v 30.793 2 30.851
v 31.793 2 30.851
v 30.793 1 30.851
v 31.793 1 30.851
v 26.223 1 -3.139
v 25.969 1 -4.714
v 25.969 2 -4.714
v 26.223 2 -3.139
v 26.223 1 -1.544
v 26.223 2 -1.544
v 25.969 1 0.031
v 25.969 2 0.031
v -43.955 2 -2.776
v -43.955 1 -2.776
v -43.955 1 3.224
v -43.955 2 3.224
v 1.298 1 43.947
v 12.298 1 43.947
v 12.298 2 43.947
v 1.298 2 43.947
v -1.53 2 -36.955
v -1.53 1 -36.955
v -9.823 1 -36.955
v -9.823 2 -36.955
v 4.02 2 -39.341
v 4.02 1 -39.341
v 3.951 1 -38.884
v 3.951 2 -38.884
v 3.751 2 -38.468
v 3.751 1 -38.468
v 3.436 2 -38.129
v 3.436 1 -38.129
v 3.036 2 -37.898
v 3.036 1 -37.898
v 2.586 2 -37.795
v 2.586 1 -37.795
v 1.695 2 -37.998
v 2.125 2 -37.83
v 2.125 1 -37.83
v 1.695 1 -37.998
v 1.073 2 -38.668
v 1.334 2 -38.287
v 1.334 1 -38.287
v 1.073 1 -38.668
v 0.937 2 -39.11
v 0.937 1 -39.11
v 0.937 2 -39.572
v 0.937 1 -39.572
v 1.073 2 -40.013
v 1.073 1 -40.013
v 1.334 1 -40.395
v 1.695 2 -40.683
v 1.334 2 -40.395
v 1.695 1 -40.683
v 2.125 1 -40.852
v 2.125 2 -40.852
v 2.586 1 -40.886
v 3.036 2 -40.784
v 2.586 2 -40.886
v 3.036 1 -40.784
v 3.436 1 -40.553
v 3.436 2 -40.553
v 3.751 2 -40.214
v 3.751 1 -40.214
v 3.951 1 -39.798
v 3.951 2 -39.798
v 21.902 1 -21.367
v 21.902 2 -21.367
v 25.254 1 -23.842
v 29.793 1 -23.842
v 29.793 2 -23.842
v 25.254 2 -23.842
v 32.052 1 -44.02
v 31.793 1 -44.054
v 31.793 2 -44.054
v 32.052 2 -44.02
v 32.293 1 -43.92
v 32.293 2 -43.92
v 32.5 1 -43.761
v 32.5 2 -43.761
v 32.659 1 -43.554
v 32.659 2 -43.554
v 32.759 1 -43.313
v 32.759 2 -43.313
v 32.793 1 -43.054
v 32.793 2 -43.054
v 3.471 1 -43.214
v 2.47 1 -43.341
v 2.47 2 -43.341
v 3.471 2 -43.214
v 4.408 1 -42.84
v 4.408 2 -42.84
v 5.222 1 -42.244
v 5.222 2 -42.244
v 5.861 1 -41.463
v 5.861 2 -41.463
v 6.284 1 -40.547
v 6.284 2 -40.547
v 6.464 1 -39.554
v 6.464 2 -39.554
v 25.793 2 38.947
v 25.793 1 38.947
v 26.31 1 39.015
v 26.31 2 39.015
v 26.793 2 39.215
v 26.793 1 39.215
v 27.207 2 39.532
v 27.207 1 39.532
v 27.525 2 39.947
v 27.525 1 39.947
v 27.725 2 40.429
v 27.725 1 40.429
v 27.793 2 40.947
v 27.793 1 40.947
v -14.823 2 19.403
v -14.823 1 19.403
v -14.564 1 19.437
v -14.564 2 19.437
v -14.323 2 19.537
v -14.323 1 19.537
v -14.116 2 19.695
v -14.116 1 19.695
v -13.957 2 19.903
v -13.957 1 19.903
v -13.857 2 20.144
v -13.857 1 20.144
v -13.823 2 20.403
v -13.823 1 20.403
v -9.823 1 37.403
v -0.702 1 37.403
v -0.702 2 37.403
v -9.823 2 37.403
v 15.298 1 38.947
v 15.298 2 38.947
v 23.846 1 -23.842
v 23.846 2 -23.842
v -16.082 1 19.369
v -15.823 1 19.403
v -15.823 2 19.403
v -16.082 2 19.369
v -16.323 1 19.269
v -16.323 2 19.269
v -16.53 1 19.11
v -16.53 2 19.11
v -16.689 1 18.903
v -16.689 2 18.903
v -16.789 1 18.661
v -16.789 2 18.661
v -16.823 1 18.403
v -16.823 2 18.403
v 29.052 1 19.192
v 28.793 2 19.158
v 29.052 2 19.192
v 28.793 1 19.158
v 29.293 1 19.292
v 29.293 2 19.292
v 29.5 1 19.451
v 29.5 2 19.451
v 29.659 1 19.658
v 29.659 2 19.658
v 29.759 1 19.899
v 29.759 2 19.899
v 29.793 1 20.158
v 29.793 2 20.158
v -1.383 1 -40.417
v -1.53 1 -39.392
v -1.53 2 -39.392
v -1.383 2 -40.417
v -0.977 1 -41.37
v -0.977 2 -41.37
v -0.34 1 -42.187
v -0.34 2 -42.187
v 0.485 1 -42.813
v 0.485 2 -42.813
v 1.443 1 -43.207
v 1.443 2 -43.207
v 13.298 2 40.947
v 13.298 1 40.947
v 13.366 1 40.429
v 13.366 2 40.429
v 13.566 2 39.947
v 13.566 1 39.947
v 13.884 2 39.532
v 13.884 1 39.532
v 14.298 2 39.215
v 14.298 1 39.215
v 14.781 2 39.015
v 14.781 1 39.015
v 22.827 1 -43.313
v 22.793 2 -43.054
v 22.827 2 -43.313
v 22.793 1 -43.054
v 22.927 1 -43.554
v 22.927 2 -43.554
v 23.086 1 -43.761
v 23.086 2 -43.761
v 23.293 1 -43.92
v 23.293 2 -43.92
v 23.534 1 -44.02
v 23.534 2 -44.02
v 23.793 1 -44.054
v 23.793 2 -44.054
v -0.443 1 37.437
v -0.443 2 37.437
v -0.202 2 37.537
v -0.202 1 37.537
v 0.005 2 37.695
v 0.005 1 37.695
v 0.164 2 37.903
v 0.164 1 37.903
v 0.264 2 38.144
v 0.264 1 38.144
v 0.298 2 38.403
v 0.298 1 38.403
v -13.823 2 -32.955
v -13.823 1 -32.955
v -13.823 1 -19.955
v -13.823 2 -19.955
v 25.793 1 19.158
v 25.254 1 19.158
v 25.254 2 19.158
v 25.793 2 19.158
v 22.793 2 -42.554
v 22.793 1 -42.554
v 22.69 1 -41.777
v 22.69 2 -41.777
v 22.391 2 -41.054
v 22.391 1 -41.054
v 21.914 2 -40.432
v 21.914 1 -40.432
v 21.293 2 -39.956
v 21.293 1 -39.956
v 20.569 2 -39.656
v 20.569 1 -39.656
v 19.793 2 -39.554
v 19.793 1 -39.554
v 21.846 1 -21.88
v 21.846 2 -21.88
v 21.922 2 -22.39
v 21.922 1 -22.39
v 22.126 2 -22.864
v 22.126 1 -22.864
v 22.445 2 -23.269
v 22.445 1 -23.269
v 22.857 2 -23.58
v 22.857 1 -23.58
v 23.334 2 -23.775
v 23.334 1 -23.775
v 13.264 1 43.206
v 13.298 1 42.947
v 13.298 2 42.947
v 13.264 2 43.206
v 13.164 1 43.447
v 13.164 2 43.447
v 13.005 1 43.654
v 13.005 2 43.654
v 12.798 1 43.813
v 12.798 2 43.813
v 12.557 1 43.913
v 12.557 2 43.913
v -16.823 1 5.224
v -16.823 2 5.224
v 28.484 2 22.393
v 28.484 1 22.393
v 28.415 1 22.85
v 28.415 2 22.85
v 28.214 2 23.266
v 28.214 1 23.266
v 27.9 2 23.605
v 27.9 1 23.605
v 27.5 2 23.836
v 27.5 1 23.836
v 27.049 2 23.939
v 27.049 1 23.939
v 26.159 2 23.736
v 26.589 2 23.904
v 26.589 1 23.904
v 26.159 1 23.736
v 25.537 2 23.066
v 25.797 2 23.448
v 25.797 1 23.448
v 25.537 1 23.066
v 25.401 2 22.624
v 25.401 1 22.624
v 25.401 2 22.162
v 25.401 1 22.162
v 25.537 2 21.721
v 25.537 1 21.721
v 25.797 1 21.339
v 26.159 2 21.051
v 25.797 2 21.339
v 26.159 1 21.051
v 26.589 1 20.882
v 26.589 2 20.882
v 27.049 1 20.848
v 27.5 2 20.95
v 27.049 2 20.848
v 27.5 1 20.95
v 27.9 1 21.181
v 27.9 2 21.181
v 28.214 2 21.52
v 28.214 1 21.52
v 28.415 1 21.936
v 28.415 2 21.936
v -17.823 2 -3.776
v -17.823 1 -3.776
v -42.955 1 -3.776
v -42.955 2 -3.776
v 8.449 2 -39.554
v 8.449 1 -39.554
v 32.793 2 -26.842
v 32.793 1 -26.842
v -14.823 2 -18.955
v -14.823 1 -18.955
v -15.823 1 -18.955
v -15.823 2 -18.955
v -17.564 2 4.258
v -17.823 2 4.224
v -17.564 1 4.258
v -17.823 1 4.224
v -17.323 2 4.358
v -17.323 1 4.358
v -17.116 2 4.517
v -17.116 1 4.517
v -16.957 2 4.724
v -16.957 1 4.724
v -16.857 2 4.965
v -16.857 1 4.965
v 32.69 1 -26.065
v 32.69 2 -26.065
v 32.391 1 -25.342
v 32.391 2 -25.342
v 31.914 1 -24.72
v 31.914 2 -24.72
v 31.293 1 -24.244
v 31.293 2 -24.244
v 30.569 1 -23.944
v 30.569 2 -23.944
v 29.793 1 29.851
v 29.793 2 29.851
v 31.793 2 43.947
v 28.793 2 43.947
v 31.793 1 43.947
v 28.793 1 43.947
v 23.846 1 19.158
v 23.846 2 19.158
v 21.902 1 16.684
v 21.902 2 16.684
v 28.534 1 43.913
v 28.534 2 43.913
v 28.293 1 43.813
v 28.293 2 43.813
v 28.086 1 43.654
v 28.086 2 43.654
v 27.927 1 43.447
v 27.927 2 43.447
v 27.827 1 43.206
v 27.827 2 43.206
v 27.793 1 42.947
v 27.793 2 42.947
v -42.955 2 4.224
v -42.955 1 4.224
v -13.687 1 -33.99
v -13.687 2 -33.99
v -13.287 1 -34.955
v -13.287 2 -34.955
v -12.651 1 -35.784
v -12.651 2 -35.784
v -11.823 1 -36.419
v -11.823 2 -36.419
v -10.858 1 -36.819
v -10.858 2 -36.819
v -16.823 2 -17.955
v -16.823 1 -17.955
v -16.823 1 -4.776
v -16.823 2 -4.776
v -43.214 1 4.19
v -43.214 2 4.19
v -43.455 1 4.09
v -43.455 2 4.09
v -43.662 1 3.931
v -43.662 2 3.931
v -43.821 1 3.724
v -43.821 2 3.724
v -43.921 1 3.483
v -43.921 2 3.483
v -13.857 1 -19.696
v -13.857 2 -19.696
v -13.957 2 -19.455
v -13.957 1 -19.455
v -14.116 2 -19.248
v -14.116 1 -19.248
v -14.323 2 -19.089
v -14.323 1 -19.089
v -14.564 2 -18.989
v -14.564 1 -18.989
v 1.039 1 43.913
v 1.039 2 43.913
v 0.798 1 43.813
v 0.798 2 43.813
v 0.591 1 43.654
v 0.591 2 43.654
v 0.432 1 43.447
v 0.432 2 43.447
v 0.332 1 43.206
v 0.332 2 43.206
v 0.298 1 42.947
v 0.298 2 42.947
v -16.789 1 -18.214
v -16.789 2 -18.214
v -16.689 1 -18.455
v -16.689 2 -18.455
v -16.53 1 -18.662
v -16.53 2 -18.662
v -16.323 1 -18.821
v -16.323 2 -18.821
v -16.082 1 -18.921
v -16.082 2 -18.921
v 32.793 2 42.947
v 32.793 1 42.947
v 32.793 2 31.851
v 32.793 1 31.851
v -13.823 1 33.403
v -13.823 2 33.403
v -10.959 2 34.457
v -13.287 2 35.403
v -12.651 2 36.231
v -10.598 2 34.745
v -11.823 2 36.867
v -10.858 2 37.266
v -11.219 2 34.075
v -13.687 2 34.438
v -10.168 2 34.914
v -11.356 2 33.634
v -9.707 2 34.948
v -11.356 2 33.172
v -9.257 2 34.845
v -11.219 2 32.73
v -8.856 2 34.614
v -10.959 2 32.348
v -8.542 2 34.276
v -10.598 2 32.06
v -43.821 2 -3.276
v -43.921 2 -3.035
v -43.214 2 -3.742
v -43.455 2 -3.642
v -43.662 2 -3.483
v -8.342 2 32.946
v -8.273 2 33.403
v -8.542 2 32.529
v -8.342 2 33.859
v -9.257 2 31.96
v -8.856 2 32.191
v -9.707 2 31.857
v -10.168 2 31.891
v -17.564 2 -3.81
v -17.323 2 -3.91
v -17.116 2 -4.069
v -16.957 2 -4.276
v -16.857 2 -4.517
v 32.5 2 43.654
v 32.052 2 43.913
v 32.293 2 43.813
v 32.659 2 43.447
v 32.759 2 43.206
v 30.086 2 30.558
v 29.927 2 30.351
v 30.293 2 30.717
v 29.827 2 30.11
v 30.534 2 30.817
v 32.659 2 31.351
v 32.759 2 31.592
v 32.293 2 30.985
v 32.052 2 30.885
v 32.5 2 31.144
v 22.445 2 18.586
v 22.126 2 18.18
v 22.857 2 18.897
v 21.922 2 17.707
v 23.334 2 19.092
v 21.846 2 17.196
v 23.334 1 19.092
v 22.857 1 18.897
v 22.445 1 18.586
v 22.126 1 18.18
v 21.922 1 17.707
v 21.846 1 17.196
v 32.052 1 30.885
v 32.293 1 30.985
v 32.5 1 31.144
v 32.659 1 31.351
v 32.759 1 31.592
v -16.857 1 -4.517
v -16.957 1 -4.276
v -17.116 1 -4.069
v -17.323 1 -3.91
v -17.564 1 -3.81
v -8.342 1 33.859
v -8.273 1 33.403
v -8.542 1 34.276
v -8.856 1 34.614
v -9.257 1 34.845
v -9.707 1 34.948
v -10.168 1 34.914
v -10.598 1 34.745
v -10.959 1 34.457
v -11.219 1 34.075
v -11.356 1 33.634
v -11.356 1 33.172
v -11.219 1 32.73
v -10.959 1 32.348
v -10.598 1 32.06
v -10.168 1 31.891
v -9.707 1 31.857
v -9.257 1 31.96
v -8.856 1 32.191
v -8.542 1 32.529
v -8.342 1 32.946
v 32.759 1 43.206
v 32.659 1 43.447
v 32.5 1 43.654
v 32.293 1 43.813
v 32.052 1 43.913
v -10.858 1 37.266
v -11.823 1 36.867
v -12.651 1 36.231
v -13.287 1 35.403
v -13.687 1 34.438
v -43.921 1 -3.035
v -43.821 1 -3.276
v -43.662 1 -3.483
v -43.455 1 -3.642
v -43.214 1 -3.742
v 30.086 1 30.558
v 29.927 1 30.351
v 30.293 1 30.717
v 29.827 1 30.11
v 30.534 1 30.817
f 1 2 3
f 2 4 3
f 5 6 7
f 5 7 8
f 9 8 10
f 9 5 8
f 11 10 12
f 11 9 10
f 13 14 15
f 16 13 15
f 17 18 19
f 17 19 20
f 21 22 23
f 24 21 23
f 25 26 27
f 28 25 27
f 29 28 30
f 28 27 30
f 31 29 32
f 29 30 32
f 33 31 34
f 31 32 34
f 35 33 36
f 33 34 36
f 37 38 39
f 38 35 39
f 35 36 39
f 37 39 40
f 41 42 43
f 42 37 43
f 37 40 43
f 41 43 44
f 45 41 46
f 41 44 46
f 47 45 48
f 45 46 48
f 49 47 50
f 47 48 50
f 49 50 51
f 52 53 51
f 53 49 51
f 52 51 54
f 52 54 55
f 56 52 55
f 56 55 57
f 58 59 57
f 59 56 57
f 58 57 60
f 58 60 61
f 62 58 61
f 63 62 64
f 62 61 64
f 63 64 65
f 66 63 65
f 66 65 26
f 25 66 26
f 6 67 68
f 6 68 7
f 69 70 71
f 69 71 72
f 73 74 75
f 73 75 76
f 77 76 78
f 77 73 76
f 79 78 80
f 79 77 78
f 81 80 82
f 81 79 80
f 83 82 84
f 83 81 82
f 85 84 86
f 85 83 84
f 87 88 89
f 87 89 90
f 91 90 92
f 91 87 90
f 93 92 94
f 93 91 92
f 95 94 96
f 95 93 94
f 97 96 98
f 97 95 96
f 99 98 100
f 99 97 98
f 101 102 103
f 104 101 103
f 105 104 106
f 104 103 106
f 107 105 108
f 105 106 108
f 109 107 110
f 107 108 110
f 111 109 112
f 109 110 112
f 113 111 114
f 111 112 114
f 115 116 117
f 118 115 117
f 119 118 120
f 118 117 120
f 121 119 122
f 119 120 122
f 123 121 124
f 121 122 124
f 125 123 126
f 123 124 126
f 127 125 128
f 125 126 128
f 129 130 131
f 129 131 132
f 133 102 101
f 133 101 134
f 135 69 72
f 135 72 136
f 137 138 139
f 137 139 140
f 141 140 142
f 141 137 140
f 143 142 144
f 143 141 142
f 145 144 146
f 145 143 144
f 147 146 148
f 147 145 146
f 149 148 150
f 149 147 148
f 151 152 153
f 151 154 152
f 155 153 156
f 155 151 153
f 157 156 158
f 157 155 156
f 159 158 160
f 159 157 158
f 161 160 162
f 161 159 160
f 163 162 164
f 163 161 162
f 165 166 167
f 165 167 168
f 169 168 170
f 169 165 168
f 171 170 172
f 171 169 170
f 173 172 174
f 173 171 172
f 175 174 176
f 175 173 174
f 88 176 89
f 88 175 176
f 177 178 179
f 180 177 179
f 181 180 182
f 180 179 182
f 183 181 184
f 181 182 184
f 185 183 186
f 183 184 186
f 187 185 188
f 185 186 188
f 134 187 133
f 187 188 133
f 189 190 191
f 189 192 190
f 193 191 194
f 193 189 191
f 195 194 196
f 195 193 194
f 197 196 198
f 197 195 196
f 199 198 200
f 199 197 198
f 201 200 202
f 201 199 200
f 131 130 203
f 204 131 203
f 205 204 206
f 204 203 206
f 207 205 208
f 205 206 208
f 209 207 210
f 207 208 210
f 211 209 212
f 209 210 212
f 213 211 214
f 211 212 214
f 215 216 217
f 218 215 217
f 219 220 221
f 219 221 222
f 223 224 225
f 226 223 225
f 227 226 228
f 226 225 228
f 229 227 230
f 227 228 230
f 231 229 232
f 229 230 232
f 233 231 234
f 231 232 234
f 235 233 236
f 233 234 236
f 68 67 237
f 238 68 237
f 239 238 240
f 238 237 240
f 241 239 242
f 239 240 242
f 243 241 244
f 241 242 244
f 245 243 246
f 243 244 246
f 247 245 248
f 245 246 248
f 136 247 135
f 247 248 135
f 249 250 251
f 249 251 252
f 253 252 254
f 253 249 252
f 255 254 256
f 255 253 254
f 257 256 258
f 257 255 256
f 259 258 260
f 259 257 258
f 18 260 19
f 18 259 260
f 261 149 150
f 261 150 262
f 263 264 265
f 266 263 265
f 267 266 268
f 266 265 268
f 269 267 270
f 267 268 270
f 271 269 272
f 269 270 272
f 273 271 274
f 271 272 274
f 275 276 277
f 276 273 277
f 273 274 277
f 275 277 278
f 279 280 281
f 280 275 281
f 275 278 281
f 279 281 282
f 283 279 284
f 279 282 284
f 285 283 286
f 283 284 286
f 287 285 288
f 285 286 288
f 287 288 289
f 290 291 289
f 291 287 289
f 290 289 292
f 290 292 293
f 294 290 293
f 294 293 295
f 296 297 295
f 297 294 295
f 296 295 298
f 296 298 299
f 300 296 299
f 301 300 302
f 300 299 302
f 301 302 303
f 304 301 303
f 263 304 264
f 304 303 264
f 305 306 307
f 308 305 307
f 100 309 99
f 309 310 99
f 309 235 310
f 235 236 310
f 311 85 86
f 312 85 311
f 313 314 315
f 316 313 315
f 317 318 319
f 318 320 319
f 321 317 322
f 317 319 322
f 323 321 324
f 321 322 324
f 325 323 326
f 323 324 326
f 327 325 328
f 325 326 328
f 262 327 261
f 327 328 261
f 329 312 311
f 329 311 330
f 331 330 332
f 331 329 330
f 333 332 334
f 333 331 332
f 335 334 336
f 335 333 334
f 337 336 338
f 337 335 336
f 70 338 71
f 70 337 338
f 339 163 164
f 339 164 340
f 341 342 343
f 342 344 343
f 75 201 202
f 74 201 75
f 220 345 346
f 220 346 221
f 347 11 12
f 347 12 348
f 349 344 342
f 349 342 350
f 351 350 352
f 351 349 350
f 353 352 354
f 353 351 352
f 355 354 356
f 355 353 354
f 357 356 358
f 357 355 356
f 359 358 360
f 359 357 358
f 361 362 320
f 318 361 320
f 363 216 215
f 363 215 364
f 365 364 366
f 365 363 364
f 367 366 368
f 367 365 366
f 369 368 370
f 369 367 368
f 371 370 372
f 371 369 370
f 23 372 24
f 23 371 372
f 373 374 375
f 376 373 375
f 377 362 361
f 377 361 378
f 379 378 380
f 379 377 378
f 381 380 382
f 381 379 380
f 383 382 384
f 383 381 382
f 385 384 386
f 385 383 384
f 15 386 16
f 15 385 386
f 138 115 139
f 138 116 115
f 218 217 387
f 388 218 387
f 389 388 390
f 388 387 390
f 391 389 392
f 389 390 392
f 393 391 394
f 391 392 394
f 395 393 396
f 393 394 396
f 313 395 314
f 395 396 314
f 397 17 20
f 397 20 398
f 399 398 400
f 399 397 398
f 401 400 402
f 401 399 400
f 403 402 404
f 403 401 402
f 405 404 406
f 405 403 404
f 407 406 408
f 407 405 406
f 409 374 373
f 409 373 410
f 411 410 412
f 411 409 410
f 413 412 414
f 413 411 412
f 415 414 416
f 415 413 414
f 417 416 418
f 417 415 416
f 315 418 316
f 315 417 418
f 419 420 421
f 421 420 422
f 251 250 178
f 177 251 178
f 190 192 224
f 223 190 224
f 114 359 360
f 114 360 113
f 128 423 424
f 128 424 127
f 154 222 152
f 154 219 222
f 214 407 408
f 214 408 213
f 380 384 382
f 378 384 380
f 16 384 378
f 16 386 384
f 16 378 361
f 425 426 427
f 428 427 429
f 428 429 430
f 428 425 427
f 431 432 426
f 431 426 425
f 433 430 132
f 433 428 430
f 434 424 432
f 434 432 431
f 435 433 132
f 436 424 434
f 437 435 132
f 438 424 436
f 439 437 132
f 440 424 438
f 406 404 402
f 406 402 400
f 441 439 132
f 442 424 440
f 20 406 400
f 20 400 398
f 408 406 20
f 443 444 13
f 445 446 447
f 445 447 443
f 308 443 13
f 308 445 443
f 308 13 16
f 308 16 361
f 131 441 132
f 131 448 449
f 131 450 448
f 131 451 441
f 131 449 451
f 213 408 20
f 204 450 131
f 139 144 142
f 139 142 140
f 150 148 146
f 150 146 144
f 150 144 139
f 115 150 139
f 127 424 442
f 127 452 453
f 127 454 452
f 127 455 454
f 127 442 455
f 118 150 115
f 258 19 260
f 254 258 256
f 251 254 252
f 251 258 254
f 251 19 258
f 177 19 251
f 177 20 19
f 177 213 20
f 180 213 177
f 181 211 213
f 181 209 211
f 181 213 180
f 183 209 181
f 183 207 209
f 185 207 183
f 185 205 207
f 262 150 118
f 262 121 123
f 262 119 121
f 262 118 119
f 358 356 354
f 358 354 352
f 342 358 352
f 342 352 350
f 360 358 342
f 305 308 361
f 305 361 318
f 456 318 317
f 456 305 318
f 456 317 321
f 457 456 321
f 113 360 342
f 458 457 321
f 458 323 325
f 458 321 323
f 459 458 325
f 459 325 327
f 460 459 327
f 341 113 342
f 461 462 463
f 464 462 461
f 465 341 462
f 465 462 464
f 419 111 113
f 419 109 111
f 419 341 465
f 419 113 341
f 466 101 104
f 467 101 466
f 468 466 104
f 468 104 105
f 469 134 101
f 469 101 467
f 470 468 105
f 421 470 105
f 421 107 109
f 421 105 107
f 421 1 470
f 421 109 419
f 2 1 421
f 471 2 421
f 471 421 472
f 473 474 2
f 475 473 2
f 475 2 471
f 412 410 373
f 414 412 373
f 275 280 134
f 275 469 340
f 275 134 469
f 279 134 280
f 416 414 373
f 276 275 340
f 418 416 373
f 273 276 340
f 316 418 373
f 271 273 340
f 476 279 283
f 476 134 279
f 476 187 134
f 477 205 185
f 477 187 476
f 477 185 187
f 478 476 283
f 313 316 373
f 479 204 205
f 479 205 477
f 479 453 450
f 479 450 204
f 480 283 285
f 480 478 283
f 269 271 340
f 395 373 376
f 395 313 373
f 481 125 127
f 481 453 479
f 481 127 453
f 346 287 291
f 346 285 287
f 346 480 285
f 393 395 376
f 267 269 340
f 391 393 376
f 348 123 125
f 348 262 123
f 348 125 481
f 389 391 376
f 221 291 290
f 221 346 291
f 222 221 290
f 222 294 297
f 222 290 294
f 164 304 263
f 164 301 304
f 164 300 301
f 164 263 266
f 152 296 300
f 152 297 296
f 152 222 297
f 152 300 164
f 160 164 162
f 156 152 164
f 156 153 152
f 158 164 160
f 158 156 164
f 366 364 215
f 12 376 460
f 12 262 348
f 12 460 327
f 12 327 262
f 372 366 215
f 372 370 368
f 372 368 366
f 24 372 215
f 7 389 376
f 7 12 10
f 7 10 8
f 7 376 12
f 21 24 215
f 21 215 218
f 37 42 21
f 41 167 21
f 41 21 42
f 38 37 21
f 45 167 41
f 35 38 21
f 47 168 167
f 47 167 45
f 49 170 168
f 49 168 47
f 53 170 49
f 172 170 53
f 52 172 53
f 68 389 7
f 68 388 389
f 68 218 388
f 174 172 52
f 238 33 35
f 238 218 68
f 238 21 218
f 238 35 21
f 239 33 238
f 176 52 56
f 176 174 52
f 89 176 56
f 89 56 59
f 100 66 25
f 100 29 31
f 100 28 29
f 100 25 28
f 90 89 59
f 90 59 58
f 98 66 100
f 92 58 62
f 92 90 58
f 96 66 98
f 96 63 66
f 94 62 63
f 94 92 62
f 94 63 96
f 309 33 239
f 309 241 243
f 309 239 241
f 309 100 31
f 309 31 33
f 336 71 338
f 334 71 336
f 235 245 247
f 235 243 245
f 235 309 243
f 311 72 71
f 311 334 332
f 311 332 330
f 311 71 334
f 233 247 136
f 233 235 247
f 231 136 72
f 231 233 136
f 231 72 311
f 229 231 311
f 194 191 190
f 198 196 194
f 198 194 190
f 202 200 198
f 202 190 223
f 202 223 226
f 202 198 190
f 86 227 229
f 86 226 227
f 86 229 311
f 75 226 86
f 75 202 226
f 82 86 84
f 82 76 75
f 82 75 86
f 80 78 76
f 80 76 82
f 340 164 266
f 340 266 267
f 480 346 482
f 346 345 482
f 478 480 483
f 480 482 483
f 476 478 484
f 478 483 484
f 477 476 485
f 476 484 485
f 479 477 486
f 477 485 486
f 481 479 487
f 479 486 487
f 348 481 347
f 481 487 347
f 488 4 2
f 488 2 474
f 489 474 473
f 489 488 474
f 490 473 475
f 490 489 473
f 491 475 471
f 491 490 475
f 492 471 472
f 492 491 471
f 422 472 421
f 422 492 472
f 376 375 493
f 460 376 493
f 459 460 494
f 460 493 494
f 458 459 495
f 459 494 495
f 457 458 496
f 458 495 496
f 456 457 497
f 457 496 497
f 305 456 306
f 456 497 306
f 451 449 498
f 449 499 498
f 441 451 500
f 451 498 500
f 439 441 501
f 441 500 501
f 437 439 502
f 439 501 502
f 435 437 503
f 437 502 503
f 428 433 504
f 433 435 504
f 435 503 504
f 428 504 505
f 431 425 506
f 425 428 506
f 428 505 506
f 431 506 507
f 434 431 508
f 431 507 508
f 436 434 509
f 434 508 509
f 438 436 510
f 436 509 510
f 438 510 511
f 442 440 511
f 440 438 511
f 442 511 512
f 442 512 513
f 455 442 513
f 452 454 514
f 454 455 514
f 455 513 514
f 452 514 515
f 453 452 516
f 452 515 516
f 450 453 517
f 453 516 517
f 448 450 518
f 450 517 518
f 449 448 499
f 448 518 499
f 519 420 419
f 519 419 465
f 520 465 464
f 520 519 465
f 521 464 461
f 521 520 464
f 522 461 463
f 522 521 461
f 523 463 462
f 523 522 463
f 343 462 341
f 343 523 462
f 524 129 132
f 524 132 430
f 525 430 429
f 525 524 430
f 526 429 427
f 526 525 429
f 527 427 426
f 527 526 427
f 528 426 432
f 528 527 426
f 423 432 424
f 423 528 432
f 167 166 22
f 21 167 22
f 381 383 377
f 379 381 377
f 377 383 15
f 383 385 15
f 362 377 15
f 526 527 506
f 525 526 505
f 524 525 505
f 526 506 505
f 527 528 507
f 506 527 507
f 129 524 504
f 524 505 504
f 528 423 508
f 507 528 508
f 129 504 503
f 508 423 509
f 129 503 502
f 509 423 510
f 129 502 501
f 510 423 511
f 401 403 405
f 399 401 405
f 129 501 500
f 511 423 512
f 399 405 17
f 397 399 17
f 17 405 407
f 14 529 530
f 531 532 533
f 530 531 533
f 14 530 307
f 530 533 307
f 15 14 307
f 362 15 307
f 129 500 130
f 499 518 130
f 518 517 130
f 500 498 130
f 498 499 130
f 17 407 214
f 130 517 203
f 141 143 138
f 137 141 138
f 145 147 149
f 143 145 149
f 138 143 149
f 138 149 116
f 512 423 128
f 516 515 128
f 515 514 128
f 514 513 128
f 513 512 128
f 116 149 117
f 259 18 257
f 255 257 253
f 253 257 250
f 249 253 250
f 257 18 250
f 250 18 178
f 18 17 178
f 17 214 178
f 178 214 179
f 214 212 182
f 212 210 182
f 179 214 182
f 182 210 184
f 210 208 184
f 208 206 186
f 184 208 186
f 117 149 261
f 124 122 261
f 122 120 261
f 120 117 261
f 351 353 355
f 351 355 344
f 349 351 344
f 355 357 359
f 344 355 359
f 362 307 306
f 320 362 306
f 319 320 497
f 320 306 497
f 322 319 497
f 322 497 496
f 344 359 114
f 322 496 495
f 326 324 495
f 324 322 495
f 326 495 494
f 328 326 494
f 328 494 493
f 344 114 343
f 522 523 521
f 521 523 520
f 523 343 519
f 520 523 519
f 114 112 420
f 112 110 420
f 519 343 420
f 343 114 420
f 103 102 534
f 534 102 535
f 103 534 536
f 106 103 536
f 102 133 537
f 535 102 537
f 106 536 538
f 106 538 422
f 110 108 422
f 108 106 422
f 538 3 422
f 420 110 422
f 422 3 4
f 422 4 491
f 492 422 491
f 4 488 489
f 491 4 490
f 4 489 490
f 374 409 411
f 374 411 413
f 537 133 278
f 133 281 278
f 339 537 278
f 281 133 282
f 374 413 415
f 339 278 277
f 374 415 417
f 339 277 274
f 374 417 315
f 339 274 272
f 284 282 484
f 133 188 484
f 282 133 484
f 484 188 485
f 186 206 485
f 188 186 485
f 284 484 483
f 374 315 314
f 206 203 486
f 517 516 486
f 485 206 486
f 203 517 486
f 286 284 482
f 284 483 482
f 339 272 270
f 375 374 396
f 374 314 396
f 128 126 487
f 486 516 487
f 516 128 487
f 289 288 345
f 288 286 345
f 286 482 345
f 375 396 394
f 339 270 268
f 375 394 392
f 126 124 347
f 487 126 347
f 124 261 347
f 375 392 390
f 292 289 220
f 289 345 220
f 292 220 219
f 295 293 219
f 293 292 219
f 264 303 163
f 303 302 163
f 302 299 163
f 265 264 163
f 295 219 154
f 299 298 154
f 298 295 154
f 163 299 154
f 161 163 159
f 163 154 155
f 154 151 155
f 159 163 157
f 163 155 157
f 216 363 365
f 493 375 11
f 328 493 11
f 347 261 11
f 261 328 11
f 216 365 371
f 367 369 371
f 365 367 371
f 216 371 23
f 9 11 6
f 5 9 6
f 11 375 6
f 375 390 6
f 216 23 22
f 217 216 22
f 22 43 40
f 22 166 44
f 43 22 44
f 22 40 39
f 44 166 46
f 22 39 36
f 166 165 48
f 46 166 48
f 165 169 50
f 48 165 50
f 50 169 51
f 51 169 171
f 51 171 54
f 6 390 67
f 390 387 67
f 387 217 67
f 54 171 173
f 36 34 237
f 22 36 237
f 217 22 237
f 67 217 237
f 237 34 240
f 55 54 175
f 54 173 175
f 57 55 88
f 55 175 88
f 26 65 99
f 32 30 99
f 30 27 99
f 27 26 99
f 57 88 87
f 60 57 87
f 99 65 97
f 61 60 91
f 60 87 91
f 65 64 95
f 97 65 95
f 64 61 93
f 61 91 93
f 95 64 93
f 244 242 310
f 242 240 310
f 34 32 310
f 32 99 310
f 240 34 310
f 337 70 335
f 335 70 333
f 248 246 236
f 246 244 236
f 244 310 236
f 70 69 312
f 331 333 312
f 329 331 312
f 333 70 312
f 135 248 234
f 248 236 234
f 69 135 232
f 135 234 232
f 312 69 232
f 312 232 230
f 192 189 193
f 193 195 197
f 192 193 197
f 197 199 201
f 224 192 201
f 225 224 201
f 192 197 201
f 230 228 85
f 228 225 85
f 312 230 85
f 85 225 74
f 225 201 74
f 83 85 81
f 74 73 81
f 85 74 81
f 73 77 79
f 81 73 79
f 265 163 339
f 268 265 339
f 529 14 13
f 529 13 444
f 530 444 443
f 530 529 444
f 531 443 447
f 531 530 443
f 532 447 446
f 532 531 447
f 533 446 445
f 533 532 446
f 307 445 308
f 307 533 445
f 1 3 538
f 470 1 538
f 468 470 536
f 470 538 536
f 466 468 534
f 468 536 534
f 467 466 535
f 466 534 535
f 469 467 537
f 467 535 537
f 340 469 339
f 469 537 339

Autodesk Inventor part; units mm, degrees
ref_plane "YZ Plane" through (0, 0, 0) normal (1, 0, 0) x (0, 1, 0)
ref_plane "XZ Plane" through (0, 0, 0) normal (0, 1, 0) x (-1, 0, 0)
ref_plane "XY Plane" through (0, 0, 0) normal (0, 0, 1) x (1, 0, 0)
ref_plane "Work Plane2" through (0, 1, 0) normal (0, 1, 0) x (1, 0, 0)
sketch "Sketch2" plane through (0, 1, 0) normal (0, 1, 0) x (1, 0, 0)
  arc A0 (-13.8229, -33.4026) -> (-9.8229, -37.4026) centre (-9.8229, -33.4026) ccw
  arc A1 (-9.8229, 36.9551) -> (-13.8229, 32.9551) centre (-9.8229, 32.9551) ccw
  circle A2 centre (2.4699, 39.3408) radius 1.55
  circle A3 centre (26.9336, -22.3933) radius 1.55
  circle A4 centre (-9.8229, -33.4026) radius 1.55
  line L0 (23.7927, 44.0538) -> (31.7927, 44.0538)
  line L1 (32.7927, 43.0538) -> (32.7927, 26.8418)
  line L2 (29.7927, 23.8418) -> (25.2541, 23.8418)
  line L3 (-17.8229, 3.7762) -> (-42.9549, 3.7762)
  line L4 (-43.9549, 2.7762) -> (-43.9549, -3.2238)
  line L5 (-42.9549, -4.2238) -> (-17.8229, -4.2238)
  line L6 (28.7927, -43.9467) -> (31.7927, -43.9467)
  line L7 (22.7927, 43.0538) -> (22.7927, 42.5538)
  arc A5 (23.7927, 44.0538) -> (22.7927, 43.0538) centre (23.7927, 43.0538) ccw
  arc A6 (32.7927, 43.0538) -> (31.7927, 44.0538) centre (31.7927, 43.0538) ccw
  arc A7 (31.7927, -43.9467) -> (32.7927, -42.9467) centre (31.7927, -42.9467) ccw
  arc A8 (27.7927, -42.9467) -> (28.7927, -43.9467) centre (28.7927, -42.9467) ccw
  arc A9 (29.7927, 23.8418) -> (32.7927, 26.8418) centre (29.7927, 26.8418) ccw
  arc A10 (19.7927, 39.5538) -> (22.7927, 42.5538) centre (19.7927, 42.5538) ccw
  arc A11 (-42.9549, 3.7762) -> (-43.9549, 2.7762) centre (-42.9549, 2.7762) ccw
  arc A12 (-43.9549, -3.2238) -> (-42.9549, -4.2238) centre (-42.9549, -3.2238) ccw
  line L8 (-13.8229, 32.9551) -> (-13.8229, 19.9551)
  line L9 (-14.8229, 18.9551) -> (-15.8229, 18.9551)
  line L10 (-16.8229, 17.9551) -> (-16.8229, 4.7762)
  line L11 (-13.8229, -33.4026) -> (-13.8229, -20.4026)
  line L12 (-14.8229, -19.4026) -> (-15.8229, -19.4026)
  line L13 (-16.8229, -18.4026) -> (-16.8229, -5.2238)
  arc A13 (-14.8229, 18.9551) -> (-13.8229, 19.9551) centre (-14.8229, 19.9551) ccw
  arc A14 (-15.8229, 18.9551) -> (-16.8229, 17.9551) centre (-15.8229, 17.9551) ccw
  arc A15 (-17.8229, 3.7762) -> (-16.8229, 4.7762) centre (-17.8229, 4.7762) ccw
  arc A16 (-16.8229, -5.2238) -> (-17.8229, -4.2238) centre (-17.8229, -5.2238) ccw
  arc A17 (-16.8229, -18.4026) -> (-15.8229, -19.4026) centre (-15.8229, -18.4026) ccw
  arc A18 (-13.8229, -20.4026) -> (-14.8229, -19.4026) centre (-14.8229, -20.4026) ccw
  arc A19 (2.4699, 43.3408) -> (-1.5298, 39.3918) centre (2.4699, 39.3408) ccw
  line L14 (-1.5298, 39.3918) -> (-1.5298, 36.9551)
  line L15 (-1.5298, 36.9551) -> (-9.8229, 36.9551)
  line L16 (12.2983, -43.9467) -> (1.2983, -43.9467)
  line L17 (0.2983, -42.9467) -> (0.2983, -38.4026)
  line L18 (-0.7017, -37.4026) -> (-9.8229, -37.4026)
  arc A20 (0.2983, -42.9467) -> (1.2983, -43.9467) centre (1.2983, -42.9467) ccw
  arc A21 (12.2983, -43.9467) -> (13.2983, -42.9467) centre (12.2983, -42.9467) ccw
  arc A22 (0.2983, -38.4026) -> (-0.7017, -37.4026) centre (-0.7017, -38.4026) ccw
  line L19 (19.7927, 39.5538) -> (8.4489, 39.5538)
  line L20 (27.7927, -42.9467) -> (27.7927, -40.9467)
  line L21 (25.7927, -38.9467) -> (15.2983, -38.9467)
  arc A23 (27.7927, -40.9467) -> (25.7927, -38.9467) centre (25.7927, -40.9467) ccw
  line L22 (13.2983, -42.9467) -> (13.2983, -40.9467)
  arc A24 (15.2983, -38.9467) -> (13.2983, -40.9467) centre (15.2983, -40.9467) ccw
  line L23 (8.4489, 39.5538) -> (6.4642, 39.5538)
  arc A25 (6.4642, 39.5538) -> (2.4699, 43.3408) centre (2.4699, 39.3408) ccw
  line L24 (25.2541, -19.1582) -> (28.7927, -19.1582)
  line L25 (28.7927, -19.1582) -> (28.7927, -19.1582)
  line L26 (29.7927, -20.1582) -> (29.7927, -29.8512)
  line L27 (32.7927, -42.9467) -> (32.7927, -31.8512)
  line L28 (31.7927, -30.8512) -> (30.7927, -30.8512)
  arc A26 (29.7927, -20.1582) -> (28.7927, -19.1582) centre (28.7927, -20.1582) ccw
  arc A27 (29.7927, -29.8512) -> (30.7927, -30.8512) centre (30.7927, -29.8512) ccw
  arc A28 (32.7927, -31.8512) -> (31.7927, -30.8512) centre (31.7927, -31.8512) ccw
  line L29 (25.2541, 23.8418) -> (23.8455, 23.8418)
  line L30 (21.9025, 21.3673) -> (25.9693, 4.7141)
  line L31 (25.9693, -0.0306) -> (21.9025, -16.6838)
  line L32 (23.8455, -19.1582) -> (25.7927, -19.1582)
  arc A29 (23.8455, 23.8418) -> (21.9025, 21.3673) centre (23.8455, 21.8418) ccw
  arc A30 (21.9025, -16.6838) -> (23.8455, -19.1582) centre (23.8455, -17.1582) ccw
  arc A31 (25.9693, -0.0306) -> (25.9693, 4.7141) centre (16.2548, 2.3418) ccw
  point P0 (0, 0)
  point P1 (22.7927, 44.0538)
  point P2 (32.7927, 44.0538)
  point P3 (32.7927, 23.8418)
  point P4 (32.7927, -43.9467)
  point P5 (-16.8229, 3.7762)
  point P6 (-16.8229, -4.2238)
  point P7 (21.2983, 23.8418)
  point P8 (30.2927, -43.9467)
  point P9 (-13.8229, 18.9551)
  point P10 (-16.8229, 18.9551)
  point P11 (-13.8229, -19.4026)
  point P12 (-16.8229, -19.4026)
  point P13 (13.2983, -43.9467)
  point P14 (0.2983, -43.9467)
  point P15 (0.2983, -37.4026)
  point P16 (27.7927, -38.9467)
  point P17 (27.7927, -42.9467)
  point P18 (29.7927, -19.1582)
  point P19 (27.0234, -19.1582)
  point P20 (27.5234, 23.8418)
  point P21 (26.5486, 2.3418)
  dimension "d13" = 3.1
  dimension "d15" = 3.1
  dimension "d26" = 1
  dimension "d27" = 3
  dimension "d32" = 1
  dimension "d33" = 20.212
  dimension "d36" = 14
  dimension "d37" = 3
  dimension "d38" = 14
  dimension "d39" = 3
  dimension "d40" = 1
  dimension "d42" = 13
  dimension "d43" = 1
  dimension "d47" = 88.0005
  dimension "d49" = 4
  dimension "d50" = 2
  dimension "d51" = 2
  dimension "d52" = 0.5
  dimension "d57" = 1
  dimension "d58" = 43
  dimension "d60" = 21.5
  dimension "d61" = 2
  dimension "d62" = 10
extrude "Extrusion2" add sketch "Sketch2" along normal blind 1
properties part number "pcb"
